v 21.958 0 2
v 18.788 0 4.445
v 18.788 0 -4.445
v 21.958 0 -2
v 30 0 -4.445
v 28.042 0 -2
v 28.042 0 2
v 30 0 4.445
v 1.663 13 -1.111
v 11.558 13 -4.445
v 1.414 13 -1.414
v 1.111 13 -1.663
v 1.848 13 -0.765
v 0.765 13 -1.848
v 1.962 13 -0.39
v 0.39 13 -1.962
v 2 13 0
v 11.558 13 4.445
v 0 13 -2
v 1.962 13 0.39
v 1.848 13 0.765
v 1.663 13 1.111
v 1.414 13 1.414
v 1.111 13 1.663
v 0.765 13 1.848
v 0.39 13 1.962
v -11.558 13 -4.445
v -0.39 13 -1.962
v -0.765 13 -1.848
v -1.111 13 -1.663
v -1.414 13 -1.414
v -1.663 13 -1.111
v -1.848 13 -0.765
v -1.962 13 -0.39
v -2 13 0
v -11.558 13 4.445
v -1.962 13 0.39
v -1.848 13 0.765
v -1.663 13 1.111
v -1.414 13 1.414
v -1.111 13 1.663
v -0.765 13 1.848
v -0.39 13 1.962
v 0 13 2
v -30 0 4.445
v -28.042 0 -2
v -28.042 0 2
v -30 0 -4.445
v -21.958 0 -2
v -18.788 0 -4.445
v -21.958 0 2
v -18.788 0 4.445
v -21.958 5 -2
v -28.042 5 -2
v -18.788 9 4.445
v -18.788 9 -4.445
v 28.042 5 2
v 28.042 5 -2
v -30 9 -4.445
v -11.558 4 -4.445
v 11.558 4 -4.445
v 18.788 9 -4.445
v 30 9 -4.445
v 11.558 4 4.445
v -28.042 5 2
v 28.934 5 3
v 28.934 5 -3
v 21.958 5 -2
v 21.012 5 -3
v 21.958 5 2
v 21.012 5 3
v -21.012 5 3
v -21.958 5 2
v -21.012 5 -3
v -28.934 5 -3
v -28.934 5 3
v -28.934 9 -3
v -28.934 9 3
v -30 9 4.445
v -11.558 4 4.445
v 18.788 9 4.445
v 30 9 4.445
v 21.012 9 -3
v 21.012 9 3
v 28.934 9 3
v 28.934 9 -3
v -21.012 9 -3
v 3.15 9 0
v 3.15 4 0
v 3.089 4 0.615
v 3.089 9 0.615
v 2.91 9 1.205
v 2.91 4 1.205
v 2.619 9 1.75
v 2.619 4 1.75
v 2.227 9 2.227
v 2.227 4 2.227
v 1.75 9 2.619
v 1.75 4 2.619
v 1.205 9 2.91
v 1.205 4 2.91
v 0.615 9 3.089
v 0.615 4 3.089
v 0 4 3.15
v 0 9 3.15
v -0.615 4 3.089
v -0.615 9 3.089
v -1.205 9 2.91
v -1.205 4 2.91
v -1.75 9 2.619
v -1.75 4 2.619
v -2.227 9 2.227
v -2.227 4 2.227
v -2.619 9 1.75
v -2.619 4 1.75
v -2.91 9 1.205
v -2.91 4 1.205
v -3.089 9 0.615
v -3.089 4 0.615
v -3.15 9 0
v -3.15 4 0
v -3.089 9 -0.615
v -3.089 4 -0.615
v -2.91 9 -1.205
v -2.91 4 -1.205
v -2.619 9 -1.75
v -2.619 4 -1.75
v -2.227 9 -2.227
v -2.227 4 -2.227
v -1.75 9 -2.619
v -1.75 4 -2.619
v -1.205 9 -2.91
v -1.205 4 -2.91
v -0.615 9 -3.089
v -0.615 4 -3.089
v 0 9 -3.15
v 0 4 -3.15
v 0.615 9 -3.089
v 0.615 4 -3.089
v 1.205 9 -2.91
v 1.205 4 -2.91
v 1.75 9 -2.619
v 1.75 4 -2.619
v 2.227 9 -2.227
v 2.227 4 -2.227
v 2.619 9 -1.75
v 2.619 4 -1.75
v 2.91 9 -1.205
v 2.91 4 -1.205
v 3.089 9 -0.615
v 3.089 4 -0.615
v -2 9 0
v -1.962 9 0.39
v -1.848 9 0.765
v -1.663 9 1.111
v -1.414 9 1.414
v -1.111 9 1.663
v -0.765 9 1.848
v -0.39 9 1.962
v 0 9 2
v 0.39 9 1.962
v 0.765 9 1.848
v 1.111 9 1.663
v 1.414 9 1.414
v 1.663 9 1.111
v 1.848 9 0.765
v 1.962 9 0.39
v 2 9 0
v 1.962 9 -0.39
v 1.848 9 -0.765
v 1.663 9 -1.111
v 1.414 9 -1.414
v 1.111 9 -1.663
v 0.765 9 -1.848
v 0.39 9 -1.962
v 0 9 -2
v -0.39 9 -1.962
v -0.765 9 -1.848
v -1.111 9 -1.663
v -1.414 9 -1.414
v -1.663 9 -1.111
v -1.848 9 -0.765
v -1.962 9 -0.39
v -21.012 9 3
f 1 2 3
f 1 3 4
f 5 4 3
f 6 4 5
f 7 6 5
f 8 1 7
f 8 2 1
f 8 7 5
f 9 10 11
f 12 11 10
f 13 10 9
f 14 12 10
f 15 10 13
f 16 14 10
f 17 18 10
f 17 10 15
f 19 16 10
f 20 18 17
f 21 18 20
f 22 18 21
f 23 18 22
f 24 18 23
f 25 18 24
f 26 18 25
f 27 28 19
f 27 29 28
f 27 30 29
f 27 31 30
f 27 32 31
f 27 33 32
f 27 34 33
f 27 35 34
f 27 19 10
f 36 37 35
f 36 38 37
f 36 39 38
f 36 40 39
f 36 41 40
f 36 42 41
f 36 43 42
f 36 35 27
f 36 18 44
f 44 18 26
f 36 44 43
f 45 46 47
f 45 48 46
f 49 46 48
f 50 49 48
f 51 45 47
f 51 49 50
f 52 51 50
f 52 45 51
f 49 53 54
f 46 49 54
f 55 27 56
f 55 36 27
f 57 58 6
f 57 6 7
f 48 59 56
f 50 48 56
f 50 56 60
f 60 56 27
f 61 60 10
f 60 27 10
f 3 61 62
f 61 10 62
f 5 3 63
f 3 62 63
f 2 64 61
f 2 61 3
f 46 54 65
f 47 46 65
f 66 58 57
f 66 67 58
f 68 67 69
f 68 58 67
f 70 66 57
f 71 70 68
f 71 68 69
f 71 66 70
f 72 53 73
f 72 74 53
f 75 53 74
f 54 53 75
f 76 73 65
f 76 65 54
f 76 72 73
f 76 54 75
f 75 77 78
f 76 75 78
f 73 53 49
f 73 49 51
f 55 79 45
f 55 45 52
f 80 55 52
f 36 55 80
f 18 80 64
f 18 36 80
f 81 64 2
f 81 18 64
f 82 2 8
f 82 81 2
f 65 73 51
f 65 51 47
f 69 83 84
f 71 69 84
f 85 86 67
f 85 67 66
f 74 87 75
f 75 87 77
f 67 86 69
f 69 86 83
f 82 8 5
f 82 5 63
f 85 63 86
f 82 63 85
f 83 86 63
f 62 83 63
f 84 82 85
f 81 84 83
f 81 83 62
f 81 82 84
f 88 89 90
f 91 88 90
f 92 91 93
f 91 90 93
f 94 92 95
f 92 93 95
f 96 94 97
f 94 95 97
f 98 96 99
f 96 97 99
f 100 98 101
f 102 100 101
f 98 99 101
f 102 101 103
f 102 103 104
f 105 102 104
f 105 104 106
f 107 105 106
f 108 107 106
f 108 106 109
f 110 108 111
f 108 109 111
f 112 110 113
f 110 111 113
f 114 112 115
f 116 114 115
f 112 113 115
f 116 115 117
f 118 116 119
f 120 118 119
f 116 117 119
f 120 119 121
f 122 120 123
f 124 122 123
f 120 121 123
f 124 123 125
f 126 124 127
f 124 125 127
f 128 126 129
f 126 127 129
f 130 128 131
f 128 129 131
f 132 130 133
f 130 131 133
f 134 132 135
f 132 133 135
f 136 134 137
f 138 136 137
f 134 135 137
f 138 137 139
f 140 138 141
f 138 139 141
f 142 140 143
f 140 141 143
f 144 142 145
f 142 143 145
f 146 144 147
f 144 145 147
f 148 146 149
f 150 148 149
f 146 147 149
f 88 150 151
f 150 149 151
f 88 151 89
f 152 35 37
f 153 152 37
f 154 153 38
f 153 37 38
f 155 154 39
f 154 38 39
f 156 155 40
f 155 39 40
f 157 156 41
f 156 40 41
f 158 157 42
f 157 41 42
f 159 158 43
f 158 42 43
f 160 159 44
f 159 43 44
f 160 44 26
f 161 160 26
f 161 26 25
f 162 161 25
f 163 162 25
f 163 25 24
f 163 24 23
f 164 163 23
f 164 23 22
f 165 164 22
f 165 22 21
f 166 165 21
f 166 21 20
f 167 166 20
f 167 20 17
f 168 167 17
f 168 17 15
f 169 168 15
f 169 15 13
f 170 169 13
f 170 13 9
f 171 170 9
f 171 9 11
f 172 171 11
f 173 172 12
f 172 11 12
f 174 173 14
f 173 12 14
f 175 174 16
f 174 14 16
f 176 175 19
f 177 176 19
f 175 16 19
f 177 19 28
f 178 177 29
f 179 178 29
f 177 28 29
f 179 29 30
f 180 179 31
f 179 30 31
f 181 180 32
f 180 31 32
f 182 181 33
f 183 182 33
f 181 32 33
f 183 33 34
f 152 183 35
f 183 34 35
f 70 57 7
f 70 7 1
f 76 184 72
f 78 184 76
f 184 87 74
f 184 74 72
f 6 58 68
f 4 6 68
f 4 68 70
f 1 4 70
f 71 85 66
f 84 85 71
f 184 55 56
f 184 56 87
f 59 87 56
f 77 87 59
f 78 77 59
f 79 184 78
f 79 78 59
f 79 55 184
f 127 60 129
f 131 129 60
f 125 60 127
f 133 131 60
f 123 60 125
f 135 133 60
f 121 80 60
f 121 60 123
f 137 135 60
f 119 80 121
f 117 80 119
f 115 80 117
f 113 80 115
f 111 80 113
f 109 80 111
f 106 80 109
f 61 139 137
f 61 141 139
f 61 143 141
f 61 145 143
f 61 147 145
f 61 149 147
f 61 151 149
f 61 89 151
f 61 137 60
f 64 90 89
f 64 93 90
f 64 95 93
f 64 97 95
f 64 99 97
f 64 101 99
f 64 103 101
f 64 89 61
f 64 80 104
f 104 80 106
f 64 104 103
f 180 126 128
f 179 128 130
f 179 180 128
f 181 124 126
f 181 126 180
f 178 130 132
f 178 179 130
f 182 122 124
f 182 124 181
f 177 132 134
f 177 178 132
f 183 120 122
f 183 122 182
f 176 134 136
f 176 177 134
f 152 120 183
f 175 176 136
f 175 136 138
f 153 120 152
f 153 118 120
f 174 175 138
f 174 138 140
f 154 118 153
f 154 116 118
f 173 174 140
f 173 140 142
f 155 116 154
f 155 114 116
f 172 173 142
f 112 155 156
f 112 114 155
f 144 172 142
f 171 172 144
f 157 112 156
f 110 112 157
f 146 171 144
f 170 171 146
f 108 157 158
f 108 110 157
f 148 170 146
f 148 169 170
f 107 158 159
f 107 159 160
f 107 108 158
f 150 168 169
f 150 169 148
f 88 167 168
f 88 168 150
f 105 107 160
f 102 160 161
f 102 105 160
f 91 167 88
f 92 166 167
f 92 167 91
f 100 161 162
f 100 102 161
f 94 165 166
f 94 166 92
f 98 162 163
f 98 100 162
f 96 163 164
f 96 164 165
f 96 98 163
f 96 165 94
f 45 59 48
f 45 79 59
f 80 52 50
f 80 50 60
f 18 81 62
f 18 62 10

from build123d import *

# Parameters (mm, degrees)
F1_DEPTH = 4.445
F2_R     = 2
F2_W     = 6.084966
F2_H     = 4
F3_DEPTH = 25
F4_R     = 3.15
F5_DEPTH = 5
F6_W     = 7.922152
F6_H     = 6
F7_DEPTH = 4


with BuildPart() as f1:
    # F0 (on Top) → F1 (new body, symmetric)
    with BuildSketch(Plane.XY):
        Polygon((-30, 9), (-30, 0), (-18.787624, 0), (-11.558056, 4), (0, 4), (11.558056, 4), (18.787624, 0), (30, 0), (30, 9), (18.787624, 9), (11.558056, 13), (0, 13), (-11.558056, 13), (-18.787624, 9), align=None)
    extrude(amount=F1_DEPTH, both=True)

    # F2 (on face) → F3 (cut)
    with BuildSketch(Plane(origin=(0, 13, 0), x_dir=(-1, 0, 0), z_dir=(0, 1, 0))):
        Circle(F2_R)
        with Locations((-25, 0)):
            Rectangle(F2_W, F2_H)
        with Locations((25, 0)):
            Rectangle(F2_W, F2_H)
    extrude(amount=-F3_DEPTH, mode=Mode.SUBTRACT)

    # F4 (on face) → F5 (cut)
    with BuildSketch(Plane.XZ.offset(-4)):
        Circle(F4_R)
    extrude(amount=-F5_DEPTH, mode=Mode.SUBTRACT)

    # F6 (on face) → F7 (cut)
    with BuildSketch(Plane(origin=(0, 9, 0), x_dir=(-1, 0, 0), z_dir=(0, 1, 0))):
        with Locations((-24.973184, 0)):
            Rectangle(F6_W, F6_H)
        with Locations((24.973184, 0)):
            Rectangle(F6_W, F6_H)
    extrude(amount=-F7_DEPTH, mode=Mode.SUBTRACT)


solid = f1.part
